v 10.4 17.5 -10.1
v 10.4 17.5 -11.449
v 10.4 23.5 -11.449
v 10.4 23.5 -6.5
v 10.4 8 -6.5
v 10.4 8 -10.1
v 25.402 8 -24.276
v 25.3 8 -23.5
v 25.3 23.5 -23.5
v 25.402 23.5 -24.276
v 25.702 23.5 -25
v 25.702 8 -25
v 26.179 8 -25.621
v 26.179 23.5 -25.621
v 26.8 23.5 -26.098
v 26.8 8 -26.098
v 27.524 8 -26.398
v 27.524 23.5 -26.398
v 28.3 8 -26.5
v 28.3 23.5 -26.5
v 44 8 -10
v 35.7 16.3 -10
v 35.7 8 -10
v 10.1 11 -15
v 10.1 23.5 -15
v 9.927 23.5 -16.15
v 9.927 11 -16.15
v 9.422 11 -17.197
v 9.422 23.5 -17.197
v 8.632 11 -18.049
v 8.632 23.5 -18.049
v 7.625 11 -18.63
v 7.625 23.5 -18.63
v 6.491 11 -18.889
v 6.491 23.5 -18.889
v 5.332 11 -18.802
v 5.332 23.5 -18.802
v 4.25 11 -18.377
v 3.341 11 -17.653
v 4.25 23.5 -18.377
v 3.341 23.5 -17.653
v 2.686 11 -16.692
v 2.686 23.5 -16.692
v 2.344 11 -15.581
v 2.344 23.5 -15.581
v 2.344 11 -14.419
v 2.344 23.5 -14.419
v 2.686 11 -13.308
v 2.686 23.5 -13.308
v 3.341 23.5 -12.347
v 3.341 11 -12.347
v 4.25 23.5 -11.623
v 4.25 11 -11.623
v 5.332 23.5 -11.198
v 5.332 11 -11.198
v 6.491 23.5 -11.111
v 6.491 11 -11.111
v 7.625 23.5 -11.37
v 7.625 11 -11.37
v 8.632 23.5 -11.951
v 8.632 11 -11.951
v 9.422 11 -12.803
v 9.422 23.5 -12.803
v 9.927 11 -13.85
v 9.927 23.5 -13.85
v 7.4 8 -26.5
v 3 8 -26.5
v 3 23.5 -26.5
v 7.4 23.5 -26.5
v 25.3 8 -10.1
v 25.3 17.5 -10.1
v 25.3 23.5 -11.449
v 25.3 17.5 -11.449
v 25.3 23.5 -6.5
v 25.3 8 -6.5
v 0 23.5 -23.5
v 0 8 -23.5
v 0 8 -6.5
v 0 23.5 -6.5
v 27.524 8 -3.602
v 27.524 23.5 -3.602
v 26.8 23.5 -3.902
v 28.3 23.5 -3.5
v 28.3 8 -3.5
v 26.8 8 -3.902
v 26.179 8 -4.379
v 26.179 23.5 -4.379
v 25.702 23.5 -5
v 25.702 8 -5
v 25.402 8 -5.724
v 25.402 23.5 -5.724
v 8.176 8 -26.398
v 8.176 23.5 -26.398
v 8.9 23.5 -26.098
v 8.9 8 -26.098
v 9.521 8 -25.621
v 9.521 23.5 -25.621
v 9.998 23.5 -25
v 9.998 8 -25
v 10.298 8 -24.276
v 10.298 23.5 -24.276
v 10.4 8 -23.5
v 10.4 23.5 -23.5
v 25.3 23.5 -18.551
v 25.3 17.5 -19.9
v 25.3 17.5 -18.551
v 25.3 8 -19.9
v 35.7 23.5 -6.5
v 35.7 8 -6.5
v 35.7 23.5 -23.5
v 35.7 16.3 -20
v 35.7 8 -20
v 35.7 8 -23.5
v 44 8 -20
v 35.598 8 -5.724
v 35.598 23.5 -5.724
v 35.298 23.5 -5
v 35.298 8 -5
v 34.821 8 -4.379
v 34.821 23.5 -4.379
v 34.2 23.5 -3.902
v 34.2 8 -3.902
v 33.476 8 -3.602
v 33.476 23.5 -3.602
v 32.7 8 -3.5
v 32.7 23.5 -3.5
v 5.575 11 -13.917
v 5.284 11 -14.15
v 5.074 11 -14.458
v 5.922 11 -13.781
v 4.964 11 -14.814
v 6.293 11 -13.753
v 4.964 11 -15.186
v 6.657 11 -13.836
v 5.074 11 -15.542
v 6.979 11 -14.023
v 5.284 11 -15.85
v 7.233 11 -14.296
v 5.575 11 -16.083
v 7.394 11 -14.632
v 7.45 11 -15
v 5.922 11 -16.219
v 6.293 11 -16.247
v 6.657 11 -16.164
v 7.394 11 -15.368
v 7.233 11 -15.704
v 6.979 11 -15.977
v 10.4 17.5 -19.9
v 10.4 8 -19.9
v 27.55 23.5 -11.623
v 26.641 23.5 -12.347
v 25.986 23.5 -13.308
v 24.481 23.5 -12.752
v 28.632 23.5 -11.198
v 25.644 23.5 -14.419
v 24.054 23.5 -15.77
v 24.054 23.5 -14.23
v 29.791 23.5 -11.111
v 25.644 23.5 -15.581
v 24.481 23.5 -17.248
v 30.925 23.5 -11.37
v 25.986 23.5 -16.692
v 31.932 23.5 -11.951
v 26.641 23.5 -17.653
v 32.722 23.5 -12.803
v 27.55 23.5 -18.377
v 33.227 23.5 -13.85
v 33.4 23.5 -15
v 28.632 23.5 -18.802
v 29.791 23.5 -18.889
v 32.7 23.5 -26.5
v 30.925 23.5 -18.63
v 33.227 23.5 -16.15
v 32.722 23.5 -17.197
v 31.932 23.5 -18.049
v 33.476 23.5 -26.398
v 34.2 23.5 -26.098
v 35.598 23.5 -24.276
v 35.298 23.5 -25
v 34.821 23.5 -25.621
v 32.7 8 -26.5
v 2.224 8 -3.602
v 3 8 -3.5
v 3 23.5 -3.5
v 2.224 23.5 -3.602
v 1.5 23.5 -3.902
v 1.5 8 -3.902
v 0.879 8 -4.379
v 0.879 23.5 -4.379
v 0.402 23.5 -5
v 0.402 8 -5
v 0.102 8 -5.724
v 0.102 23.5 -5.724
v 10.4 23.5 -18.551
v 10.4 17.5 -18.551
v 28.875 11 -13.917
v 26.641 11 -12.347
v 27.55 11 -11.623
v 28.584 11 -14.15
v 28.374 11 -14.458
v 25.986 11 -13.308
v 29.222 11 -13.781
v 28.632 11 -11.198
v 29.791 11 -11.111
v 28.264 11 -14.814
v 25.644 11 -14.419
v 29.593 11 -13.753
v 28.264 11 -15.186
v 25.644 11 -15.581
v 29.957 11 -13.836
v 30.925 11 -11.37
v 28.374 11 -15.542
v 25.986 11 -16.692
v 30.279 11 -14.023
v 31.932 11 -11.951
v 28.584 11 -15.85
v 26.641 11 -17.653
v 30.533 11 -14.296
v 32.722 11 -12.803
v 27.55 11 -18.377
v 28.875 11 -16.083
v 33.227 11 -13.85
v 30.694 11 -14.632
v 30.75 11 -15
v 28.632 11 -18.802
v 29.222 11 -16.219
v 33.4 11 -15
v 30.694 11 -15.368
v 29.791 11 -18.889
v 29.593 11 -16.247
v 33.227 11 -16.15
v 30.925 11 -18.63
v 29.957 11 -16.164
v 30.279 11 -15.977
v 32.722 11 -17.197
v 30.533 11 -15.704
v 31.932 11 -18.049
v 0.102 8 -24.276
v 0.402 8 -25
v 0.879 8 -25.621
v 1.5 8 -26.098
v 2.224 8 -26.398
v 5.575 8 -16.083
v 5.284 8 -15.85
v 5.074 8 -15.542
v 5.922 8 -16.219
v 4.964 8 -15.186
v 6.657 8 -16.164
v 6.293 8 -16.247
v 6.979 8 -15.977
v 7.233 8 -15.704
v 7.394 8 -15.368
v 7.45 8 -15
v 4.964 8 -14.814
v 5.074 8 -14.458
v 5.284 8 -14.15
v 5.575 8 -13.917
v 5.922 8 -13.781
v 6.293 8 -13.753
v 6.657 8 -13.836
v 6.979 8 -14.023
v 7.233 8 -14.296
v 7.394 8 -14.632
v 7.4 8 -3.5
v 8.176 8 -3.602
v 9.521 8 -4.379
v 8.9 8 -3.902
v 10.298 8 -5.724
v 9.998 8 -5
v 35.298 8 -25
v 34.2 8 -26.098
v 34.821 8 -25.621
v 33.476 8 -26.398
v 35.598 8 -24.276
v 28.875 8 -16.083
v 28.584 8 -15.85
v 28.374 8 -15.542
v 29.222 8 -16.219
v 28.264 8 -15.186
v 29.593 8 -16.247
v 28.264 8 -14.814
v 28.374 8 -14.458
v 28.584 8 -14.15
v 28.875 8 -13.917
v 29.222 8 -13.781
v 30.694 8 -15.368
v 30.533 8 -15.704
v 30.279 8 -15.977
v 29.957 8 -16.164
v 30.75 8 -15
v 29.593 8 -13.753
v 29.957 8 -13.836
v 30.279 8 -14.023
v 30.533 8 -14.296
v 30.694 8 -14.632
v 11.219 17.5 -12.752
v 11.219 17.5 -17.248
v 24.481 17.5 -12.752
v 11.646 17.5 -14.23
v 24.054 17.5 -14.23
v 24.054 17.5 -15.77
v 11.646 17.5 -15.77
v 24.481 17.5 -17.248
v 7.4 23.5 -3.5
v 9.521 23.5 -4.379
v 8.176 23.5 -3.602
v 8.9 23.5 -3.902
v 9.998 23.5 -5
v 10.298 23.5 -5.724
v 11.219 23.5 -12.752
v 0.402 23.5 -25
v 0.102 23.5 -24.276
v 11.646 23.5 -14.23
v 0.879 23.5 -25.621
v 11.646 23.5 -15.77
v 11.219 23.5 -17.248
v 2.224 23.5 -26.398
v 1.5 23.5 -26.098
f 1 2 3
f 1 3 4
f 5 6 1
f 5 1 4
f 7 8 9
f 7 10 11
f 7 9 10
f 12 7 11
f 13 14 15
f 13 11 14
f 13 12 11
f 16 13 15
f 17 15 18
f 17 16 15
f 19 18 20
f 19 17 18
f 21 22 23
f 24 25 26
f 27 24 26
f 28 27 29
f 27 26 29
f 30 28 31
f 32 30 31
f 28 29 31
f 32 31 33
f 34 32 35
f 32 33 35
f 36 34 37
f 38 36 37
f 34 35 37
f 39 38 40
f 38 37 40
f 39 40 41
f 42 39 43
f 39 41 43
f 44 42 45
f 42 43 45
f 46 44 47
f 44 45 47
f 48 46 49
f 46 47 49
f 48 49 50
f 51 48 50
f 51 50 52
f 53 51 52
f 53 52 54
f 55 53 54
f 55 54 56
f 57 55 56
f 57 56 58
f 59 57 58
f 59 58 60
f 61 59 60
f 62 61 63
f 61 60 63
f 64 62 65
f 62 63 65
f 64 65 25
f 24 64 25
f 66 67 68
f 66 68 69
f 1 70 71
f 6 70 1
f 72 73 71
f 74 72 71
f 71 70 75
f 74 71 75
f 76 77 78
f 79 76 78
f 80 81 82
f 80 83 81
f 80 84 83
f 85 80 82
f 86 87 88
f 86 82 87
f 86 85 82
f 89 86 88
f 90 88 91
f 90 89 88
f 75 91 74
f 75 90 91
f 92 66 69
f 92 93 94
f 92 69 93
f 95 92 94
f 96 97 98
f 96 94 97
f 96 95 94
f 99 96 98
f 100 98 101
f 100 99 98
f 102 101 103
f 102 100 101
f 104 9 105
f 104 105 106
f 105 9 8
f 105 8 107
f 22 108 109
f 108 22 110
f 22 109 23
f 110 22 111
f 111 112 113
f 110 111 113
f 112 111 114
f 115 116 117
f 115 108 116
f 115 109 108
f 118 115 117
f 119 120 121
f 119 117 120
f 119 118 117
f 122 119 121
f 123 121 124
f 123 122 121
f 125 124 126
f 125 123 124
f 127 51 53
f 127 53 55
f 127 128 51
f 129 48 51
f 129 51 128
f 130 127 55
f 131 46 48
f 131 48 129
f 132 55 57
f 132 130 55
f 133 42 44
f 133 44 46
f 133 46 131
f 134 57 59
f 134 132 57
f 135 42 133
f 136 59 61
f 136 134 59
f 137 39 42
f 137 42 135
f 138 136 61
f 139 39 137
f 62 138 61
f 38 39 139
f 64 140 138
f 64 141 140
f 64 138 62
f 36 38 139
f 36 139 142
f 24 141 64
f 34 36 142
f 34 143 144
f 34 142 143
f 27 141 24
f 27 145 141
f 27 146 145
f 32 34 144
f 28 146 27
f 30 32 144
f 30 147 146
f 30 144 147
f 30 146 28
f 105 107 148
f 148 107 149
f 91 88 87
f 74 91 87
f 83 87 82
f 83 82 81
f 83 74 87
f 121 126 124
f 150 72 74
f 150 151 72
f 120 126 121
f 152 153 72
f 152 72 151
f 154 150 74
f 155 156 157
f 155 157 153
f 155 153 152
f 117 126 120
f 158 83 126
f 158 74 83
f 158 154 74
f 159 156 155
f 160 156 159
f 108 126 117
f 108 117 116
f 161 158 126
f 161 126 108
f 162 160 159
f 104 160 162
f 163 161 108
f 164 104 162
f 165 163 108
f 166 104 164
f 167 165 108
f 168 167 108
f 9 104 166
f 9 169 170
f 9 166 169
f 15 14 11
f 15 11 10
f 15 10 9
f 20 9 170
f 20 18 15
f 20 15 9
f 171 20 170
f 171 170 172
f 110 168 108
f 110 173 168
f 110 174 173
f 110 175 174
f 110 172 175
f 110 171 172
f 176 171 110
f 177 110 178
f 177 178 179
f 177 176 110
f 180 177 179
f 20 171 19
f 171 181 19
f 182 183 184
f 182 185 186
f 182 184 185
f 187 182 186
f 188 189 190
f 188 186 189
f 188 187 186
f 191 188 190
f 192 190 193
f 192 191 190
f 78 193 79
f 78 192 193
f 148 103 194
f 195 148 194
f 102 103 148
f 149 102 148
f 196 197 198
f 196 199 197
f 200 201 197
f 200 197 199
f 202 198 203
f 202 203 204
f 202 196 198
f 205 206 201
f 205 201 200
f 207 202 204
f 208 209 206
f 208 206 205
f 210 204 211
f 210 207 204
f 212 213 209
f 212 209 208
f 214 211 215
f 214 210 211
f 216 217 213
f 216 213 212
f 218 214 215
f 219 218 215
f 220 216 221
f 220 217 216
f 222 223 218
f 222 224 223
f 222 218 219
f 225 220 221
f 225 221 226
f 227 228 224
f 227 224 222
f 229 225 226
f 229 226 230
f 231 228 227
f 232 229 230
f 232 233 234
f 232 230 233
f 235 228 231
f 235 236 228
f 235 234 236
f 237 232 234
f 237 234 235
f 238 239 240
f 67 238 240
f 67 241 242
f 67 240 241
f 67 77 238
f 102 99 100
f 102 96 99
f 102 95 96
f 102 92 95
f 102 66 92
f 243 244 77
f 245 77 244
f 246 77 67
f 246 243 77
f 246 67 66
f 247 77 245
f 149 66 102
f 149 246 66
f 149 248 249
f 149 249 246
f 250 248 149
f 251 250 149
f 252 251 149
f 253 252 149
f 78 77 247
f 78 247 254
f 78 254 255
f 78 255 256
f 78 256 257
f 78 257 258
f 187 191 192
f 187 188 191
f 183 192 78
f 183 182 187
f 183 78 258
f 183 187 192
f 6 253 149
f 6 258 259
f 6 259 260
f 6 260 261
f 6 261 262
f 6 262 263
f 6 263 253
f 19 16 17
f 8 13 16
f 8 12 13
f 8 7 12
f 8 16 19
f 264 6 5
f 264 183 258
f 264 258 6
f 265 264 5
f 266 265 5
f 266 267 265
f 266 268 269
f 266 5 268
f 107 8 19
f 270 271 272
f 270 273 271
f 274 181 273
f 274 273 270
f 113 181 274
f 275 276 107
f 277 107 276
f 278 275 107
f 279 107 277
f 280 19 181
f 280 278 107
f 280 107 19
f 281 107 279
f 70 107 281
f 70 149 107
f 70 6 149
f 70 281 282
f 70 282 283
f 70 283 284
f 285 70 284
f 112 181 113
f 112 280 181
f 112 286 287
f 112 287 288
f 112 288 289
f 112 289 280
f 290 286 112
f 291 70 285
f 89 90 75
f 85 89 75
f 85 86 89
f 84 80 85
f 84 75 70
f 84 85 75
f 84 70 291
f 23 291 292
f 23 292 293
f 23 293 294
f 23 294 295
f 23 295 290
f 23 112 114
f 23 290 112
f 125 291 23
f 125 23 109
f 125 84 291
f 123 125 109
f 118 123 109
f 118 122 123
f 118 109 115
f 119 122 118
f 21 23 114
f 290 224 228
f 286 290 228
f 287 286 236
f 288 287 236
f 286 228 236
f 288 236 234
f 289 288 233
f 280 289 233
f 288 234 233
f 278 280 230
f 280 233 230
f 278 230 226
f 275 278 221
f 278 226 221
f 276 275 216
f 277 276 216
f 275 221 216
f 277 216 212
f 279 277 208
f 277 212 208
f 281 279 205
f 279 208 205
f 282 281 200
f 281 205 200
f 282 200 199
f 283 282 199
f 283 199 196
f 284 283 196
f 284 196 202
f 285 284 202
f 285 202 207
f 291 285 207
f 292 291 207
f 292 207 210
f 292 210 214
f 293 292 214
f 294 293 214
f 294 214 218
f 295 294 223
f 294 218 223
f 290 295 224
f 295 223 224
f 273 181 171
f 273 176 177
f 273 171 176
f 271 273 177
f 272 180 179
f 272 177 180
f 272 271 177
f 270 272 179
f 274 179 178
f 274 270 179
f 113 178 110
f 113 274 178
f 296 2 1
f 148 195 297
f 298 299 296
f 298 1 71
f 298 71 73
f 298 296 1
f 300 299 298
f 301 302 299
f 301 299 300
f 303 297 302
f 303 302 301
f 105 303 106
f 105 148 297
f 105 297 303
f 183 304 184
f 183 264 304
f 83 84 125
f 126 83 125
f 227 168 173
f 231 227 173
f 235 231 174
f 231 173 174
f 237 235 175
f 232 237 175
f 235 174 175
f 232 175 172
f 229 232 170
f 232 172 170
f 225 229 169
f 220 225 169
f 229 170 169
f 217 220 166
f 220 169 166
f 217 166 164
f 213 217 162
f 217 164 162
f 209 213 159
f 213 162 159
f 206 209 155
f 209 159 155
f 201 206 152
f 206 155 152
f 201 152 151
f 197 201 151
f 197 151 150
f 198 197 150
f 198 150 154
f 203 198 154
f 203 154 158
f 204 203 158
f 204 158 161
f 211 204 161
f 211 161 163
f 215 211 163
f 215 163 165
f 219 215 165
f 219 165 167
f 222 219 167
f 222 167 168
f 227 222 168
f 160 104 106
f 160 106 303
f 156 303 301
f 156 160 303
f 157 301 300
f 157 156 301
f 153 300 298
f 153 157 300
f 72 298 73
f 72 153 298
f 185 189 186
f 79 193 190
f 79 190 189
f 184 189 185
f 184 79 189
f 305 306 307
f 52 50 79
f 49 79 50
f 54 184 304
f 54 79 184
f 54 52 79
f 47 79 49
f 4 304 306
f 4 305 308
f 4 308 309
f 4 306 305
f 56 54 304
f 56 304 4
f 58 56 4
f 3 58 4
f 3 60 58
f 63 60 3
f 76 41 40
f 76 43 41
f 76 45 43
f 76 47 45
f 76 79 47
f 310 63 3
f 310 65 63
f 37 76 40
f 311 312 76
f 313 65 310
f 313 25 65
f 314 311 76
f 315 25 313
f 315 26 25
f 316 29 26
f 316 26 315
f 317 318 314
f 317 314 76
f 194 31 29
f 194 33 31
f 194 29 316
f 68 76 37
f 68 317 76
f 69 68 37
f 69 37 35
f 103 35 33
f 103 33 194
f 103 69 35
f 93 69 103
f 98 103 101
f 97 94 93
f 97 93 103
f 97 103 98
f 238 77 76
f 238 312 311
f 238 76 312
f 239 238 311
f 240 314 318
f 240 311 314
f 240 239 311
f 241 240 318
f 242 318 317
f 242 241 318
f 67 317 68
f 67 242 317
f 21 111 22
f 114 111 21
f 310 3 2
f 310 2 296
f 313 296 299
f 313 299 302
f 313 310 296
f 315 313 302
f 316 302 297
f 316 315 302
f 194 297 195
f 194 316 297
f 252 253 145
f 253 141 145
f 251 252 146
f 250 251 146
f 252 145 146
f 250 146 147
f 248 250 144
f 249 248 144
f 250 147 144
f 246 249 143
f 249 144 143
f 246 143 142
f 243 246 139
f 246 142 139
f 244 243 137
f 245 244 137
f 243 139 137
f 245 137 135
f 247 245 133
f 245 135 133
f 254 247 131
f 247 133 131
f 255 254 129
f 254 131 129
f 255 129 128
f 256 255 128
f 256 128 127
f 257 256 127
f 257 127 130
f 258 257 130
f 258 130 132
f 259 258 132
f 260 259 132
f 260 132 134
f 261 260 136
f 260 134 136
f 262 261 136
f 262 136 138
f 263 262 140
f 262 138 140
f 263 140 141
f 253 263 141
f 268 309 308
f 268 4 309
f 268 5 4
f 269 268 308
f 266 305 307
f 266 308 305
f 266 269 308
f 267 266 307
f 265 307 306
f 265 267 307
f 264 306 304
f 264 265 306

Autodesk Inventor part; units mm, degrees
ref_plane "YZ Plane" through (0, 0, 0) normal (1, 0, 0) x (0, 1, 0)
ref_plane "XZ Plane" through (0, 0, 0) normal (0, 1, 0) x (-1, 0, 0)
sketch "Boceto1" plane through (0, 0, 0) normal (0, 1, 0) x (-1, 0, 0)
  line L0 (0, 0) -> (-44, 0)
  line L1 (-44, 0) -> (-44, -30)
  line L2 (-44, -30) -> (0, -30)
  line L3 (0, -30) -> (0, 0)
  dimension "d0" = 30
  dimension "d1" = 44
extrude "Extrusión1" add sketch "Boceto1" along normal blind 8
sketch "Boceto2" plane through (0, 8, 0) normal (0, 1, 0) x (1, 0, 0)
  line L0 (-5.2329, 15) -> (48.4559, 15)
  line L1 (3, 26.5) -> (7.4, 26.5)
  line L2 (10.4, 23.5) -> (10.4, 6.5)
  line L3 (7.4, 3.5) -> (3, 3.5)
  line L4 (0, 6.5) -> (0, 15)
  line L5 (0, 30) -> (0, 0) projected
  line L6 (0, 15) -> (0, 23.5)
  arc A0 (0, 6.5) -> (3, 3.5) centre (3, 6.5) ccw
  arc A1 (3, 26.5) -> (0, 23.5) centre (3, 23.5) ccw
  arc A2 (10.4, 23.5) -> (7.4, 26.5) centre (7.4, 23.5) ccw
  arc A3 (7.4, 3.5) -> (10.4, 6.5) centre (7.4, 6.5) ccw
  line L7 (10.4, 15) -> (25.3, 15)
  line L8 (25.3, 15) -> (25.3, 19.9)
  line L9 (25.3, 19.9) -> (10.4, 19.9)
  line L10 (10.4, 19.9) -> (10.4, 15)
  line L11 (10.4, 15) -> (25.3, 15)
  line L12 (25.3, 15) -> (25.3, 10.1)
  line L13 (25.3, 10.1) -> (10.4, 10.1)
  line L14 (10.4, 10.1) -> (10.4, 15)
  line L15 (17.85, -3.2018) -> (17.85, 35.6428)
  line L16 (32.7, 26.5) -> (28.3, 26.5)
  line L17 (25.3, 23.5) -> (25.3, 6.5)
  line L18 (28.3, 3.5) -> (32.7, 3.5)
  line L19 (35.7, 6.5) -> (35.7, 15)
  line L20 (35.7, 15) -> (35.7, 23.5)
  arc A4 (32.7, 3.5) -> (35.7, 6.5) centre (32.7, 6.5) ccw
  arc A5 (35.7, 23.5) -> (32.7, 26.5) centre (32.7, 23.5) ccw
  arc A6 (28.3, 26.5) -> (25.3, 23.5) centre (28.3, 23.5) ccw
  arc A7 (25.3, 6.5) -> (28.3, 3.5) centre (28.3, 6.5) ccw
  line L21 (25.3, 19.9) -> (25.3, 15)
  line L22 (25.3, 10.1) -> (25.3, 15)
  point P0 (0, 26.5)
  point P1 (10.4, 26.5)
  point P2 (0, 3.5)
  point P3 (40.9329, 15)
  point P4 (35.7, 26.5)
  point P5 (25.3, 26.5)
  point P6 (35.7, 3.5)
  dimension "d5" = 11.5
  dimension "d6" = 11.5
  dimension "d7" = 10.4
  dimension "d8" = 3
  dimension "d9" = 14.9
  dimension "d10" = 4.9
  dimension "d11" = 4.9
  dimension "d12" = 9.8
  dimension "d13" = 35.7
extrude "Extrusión2" add sketch "Boceto2" along normal blind 15.5
sketch "Boceto3" plane through (0, 23.5, 0) normal (0, 1, 0) x (1, 0, 0)
  circle A0 centre (6.2, 15) radius 5.5
  circle A1 centre (29.5, 15) radius 5.5
  line L0 (0, 23.5) -> (0, 6.5) projected
  line L1 (35.7, 6.5) -> (35.7, 23.5) projected
  line L2 (10.4, 10.1) -> (10.4, 6.5) projected
  line L3 (10.4, 10.1) -> (10.4, 11.4489)
  line L4 (10.4, 19.9) -> (25.3, 19.9) projected
  line L5 (10.4, 18.5511) -> (10.4, 19.9)
  line L6 (10.4, 10.1) -> (25.3, 10.1) projected
  line L7 (25.3, 11.4489) -> (25.3, 10.1)
  line L8 (25.3, 18.5511) -> (25.3, 19.9)
  line L9 (25.3, 19.9) -> (10.4, 19.9)
  point P0 (0, 0)
  dimension "d16" = 6.2
  dimension "d17" = 6.2
  dimension "d18" = 11
  dimension "d19" = 11
  dimension "d26" = 23.3
extrude "Extrusión3" cut sketch "Boceto3" against normal blind 6 contours A0 L5 L4 L8 A1 L7 L6 L3
sketch "Boceto4" plane through (0, 23.5, 0) normal (0, 1, 0) x (1, 0, 0)
  arc A0 (10.4, 11.4489) -> (10.4, 18.5511) centre (6.2, 15) ccw projected
  circle A1 centre (6.2, 15) radius 3.9
  arc A2 (25.3, 18.5511) -> (25.3, 11.4489) centre (29.5, 15) ccw projected
  circle A3 centre (29.5, 15) radius 3.9
  point P0 (0, 0)
  dimension "d22" = 7.8
  dimension "d23" = 7.8
extrude "Extrusión4" cut sketch "Boceto4" against normal blind 12.5
sketch "Boceto5" plane through (6.2, 11, -15) normal (0, 1, 0) x (1, 0, 0)
  circle A0 centre (0, 0) radius 3.9 projected
  circle A1 centre (0, 0) radius 1.25
  circle A2 centre (23.3, 0) radius 3.9 projected
  circle A3 centre (23.3, 0) radius 1.25
  point P0 (-6.2, -15)
  dimension "d27" = 2.5
  dimension "d28" = 2.5
extrude "Extrusión5" cut sketch "Boceto5" against normal blind 8 contours A1 | A3
ref_plane "Plano de trabajo1" through (0, 0, -15) normal (0, 0, 1) x (1, 0, 0)
sketch "Boceto6" plane through (0, 0, -15) normal (0, 0, 1) x (1, 0, 0)
  line L0 (0, 8) -> (44, 8) projected
  line L1 (35.7, 8) -> (35.7, 23.5) projected
  line L2 (44, 8) -> (35.7, 8)
  line L3 (35.7, 8) -> (35.7, 16.3)
  line L4 (35.7, 16.3) -> (44, 8)
  point P0 (0, 0)
  dimension "d32" = 8.3
extrude "Extrusión6" add sketch "Boceto6" along normal mid plane 10
sketch "Boceto7" plane through (0, 0, 0) normal (0, -1, 0) x (1, 0, 0)
  line L0 (44, 0) -> (44, -30) projected
  line L1 (0, 0) -> (44, 0)
  line L2 (44, 0) -> (44, -30)
  line L3 (44, -30) -> (0, -30)
  line L4 (0, -30) -> (0, 0)
extrude "Extrusión7" cut sketch "Boceto7" against normal blind 8
properties part number "Primer inserto" material "Plastico PETG"
